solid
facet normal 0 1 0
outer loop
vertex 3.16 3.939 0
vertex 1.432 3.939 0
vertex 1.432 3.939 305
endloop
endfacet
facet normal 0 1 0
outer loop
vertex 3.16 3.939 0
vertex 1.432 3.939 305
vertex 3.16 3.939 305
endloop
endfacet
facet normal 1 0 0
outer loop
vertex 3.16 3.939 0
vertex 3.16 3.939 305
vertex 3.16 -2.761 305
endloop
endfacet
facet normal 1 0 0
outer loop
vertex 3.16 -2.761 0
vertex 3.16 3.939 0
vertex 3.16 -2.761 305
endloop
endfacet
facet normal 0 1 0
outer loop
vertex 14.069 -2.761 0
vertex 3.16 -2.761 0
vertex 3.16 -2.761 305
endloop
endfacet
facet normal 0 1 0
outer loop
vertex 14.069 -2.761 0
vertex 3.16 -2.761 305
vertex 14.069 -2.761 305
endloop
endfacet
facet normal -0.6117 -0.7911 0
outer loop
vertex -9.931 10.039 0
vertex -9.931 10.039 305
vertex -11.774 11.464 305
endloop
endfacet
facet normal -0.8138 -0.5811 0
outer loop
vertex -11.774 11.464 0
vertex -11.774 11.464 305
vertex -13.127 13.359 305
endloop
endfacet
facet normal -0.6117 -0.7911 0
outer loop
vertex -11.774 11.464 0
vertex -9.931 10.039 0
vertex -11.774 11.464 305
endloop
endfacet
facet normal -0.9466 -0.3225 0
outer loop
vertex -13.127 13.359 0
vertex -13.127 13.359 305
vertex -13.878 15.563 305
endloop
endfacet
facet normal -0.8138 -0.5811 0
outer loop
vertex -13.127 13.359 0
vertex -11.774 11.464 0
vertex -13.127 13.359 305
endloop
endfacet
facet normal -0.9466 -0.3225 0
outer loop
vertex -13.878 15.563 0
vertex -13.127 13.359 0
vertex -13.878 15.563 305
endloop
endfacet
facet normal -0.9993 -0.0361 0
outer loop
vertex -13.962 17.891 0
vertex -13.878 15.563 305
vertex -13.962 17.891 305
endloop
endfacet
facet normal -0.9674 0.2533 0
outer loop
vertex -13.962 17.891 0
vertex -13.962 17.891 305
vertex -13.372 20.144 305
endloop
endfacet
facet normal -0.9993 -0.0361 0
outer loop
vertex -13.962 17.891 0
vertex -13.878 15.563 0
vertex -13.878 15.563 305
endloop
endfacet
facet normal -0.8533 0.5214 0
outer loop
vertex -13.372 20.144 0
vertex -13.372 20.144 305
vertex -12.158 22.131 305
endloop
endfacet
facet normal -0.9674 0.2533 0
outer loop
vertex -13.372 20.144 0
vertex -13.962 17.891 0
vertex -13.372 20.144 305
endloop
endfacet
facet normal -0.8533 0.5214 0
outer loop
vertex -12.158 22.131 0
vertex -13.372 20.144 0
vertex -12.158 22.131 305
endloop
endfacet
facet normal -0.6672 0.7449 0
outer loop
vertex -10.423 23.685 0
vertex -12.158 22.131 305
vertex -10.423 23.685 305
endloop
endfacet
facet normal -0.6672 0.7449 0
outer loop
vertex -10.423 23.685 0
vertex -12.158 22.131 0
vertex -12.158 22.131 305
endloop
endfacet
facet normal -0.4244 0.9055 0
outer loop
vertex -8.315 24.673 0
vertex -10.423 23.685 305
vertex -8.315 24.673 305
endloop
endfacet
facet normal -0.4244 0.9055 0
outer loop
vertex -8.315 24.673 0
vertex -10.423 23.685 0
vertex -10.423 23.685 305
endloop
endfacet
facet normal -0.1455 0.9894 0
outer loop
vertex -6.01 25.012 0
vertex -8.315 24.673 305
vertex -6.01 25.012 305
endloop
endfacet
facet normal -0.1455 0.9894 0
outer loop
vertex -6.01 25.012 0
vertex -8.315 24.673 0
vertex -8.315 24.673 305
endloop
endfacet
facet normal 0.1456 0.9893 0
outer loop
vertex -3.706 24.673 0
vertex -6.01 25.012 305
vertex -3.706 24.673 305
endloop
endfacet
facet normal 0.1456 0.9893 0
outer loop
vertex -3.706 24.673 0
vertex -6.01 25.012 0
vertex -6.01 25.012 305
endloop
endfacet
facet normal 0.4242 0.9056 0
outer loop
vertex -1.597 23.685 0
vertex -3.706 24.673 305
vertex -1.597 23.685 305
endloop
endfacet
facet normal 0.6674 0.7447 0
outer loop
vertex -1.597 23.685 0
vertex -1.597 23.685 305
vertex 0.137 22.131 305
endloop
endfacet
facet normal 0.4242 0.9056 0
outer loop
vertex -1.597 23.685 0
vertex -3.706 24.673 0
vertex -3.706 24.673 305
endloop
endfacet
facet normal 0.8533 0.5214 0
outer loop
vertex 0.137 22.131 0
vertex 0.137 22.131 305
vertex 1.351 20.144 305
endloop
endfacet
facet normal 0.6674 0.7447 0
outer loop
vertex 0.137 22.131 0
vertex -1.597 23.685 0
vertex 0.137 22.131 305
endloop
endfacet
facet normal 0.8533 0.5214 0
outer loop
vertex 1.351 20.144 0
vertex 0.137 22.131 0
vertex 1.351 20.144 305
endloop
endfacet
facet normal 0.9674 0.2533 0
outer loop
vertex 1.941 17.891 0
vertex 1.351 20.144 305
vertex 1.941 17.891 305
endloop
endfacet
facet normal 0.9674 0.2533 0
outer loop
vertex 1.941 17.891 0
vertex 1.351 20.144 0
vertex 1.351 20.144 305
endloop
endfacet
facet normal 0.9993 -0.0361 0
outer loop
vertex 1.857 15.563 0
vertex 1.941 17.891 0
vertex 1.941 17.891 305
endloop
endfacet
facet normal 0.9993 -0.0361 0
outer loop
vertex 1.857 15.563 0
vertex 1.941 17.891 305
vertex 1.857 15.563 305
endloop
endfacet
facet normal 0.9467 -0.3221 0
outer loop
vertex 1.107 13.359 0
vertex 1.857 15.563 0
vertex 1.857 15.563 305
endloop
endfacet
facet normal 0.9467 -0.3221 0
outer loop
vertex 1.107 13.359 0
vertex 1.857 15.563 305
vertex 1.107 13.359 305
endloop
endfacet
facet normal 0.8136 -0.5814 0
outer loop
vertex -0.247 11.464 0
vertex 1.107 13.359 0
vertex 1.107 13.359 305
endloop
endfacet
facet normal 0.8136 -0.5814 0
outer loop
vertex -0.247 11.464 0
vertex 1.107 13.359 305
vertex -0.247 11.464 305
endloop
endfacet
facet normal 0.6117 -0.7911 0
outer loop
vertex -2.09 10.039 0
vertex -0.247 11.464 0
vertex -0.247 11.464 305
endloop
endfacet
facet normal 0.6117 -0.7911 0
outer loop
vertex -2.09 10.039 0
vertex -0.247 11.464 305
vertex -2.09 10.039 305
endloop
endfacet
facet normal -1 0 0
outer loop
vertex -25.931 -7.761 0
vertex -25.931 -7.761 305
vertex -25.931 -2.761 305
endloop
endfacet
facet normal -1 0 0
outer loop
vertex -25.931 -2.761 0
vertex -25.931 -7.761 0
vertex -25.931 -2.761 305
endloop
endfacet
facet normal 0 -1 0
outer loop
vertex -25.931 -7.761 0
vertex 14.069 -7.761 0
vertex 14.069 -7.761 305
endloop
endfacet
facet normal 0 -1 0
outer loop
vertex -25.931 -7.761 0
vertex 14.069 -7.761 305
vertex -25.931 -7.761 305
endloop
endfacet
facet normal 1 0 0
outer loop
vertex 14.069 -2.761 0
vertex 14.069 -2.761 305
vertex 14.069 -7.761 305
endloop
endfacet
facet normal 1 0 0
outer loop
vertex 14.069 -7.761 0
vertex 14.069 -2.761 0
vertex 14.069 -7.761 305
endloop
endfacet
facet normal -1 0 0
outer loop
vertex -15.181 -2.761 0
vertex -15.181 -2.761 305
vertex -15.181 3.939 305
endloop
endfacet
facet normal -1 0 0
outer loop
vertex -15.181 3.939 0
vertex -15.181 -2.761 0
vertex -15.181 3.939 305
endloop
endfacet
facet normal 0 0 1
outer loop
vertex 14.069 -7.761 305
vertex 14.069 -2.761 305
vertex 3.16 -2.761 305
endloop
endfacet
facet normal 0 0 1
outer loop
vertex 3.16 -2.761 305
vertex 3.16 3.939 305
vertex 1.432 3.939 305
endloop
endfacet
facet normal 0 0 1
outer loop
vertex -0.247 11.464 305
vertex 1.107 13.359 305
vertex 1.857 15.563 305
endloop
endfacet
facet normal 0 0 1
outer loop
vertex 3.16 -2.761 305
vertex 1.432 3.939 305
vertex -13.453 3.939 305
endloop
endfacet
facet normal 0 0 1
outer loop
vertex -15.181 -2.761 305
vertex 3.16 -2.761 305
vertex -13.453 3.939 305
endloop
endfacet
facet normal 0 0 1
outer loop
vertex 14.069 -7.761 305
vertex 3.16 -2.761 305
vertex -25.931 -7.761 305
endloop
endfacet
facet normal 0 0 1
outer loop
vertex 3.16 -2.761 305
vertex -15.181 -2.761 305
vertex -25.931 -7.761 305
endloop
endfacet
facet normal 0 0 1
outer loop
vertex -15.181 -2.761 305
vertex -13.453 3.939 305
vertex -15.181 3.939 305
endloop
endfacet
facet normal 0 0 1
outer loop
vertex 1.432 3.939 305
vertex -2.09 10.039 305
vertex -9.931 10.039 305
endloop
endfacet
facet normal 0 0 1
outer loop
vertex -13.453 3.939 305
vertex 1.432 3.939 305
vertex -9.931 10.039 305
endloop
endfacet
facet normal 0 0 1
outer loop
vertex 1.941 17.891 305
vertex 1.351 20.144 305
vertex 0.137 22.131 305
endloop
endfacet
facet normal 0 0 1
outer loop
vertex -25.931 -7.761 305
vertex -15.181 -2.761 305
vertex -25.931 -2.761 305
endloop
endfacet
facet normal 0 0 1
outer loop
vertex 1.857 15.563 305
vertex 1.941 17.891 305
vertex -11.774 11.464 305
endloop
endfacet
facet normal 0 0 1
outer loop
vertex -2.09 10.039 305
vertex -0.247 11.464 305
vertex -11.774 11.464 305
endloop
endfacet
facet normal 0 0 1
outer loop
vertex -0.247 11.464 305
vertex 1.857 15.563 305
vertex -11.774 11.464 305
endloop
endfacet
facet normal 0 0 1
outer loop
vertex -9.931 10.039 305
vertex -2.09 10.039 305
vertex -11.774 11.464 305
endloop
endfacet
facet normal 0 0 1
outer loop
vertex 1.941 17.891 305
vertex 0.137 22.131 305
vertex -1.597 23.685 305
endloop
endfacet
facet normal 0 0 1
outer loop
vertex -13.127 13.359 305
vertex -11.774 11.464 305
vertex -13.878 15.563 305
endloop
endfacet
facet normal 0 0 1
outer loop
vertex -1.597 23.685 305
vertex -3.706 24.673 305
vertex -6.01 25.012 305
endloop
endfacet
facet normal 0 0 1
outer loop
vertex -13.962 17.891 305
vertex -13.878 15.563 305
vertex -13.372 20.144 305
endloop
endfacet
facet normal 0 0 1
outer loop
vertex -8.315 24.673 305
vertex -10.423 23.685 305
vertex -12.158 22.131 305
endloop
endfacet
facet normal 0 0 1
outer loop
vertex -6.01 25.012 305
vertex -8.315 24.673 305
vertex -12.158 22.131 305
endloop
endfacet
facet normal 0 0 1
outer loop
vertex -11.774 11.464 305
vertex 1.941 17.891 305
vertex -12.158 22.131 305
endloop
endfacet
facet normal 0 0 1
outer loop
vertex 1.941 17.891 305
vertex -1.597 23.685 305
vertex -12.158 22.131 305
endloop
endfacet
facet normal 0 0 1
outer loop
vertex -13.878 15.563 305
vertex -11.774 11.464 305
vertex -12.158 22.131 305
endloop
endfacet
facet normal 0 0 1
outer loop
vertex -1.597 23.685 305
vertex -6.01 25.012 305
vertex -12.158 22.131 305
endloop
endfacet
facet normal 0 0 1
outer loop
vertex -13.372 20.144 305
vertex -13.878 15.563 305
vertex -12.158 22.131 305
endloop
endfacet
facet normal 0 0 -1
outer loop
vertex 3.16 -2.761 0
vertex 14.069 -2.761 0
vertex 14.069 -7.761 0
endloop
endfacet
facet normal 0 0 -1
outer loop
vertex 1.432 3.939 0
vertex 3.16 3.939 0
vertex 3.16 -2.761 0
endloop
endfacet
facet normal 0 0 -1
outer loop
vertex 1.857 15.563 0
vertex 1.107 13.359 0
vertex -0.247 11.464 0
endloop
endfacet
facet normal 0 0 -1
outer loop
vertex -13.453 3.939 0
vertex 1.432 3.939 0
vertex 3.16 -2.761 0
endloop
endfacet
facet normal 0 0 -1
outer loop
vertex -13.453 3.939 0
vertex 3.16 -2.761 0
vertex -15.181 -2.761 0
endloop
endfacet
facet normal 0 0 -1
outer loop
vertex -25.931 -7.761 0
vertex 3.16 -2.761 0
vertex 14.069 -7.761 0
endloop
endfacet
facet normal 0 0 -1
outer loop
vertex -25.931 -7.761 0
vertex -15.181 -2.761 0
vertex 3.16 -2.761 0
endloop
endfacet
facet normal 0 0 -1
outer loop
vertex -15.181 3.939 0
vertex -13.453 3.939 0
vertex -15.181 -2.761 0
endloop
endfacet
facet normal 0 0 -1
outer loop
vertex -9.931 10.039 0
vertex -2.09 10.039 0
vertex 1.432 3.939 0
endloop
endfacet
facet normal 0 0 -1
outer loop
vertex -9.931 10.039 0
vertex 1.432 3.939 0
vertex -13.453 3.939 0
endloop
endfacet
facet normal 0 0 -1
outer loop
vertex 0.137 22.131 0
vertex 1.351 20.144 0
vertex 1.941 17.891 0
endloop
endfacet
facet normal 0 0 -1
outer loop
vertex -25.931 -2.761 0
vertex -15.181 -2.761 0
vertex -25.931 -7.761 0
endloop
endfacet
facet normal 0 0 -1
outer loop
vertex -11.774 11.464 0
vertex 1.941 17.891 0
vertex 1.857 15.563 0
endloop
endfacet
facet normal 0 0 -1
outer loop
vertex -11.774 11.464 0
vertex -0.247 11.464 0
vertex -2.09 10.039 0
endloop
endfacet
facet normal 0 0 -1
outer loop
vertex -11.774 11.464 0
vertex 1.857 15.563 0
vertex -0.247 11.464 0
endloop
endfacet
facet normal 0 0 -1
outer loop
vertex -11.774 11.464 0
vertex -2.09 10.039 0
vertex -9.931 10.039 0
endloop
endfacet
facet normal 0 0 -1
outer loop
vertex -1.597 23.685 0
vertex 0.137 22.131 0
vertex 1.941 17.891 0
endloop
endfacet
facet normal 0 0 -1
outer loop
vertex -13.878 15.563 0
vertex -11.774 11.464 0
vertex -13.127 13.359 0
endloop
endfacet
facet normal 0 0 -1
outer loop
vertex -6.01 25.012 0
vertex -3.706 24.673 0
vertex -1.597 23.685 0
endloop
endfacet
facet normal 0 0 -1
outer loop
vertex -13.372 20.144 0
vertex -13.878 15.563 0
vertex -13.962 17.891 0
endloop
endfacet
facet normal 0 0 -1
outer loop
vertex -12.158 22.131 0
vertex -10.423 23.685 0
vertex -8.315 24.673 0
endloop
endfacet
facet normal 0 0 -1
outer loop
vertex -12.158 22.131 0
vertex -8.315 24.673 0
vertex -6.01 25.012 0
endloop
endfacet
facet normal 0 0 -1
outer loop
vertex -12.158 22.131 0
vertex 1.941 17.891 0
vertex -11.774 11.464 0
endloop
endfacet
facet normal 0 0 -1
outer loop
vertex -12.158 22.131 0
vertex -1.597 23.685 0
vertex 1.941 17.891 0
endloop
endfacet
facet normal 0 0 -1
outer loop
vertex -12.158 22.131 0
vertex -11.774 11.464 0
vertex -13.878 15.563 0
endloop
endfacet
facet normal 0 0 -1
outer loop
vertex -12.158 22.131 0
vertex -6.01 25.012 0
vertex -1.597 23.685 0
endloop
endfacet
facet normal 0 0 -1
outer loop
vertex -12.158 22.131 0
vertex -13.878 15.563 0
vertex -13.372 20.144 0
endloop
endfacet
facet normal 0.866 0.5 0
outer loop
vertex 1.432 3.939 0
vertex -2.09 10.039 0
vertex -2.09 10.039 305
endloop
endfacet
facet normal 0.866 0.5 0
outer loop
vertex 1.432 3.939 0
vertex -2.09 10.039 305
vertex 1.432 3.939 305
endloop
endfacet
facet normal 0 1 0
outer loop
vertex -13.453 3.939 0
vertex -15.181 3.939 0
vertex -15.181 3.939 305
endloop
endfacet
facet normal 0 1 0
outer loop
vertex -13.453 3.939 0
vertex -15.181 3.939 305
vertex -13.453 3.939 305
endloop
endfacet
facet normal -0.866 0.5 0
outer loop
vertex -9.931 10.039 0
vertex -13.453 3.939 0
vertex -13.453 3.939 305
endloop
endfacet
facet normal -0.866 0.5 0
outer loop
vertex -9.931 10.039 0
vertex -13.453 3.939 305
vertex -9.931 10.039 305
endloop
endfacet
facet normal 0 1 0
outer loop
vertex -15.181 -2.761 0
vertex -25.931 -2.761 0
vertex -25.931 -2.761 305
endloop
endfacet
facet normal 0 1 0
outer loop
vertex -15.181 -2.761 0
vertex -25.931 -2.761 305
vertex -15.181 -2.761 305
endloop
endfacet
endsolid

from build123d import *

# Parameters (mm, degrees)
BOSS_EXTRU_1_DEPTH = 305


with BuildPart() as part:
    # Esquisse1 → Boss.-Extru.1 (new body)
    with BuildSketch(Plane.XY):
        with BuildLine():
            Line((-25.931265673, -2.76101993), (-15.181265673, -2.76101993))
            Line((-15.181265673, -2.76101993), (-15.181265673, 3.93898007))
            Line((-15.181265673, 3.93898007), (-13.453102315, 3.93898007))
            Line((-13.453102315, 3.93898007), (-9.931265673, 10.03898007))
            ThreePointArc((-9.931265673, 10.03898007), (-6.010431334, 25.012290482), (-2.089596996, 10.03898007))
            Line((-2.089596996, 10.03898007), (1.432239646, 3.93898007))
            Line((1.432239646, 3.93898007), (3.160403004, 3.93898007))
            Line((3.160403004, 3.93898007), (3.160403004, -2.76101993))
            Line((3.160403004, -2.76101993), (14.068734327, -2.76101993))
            Line((14.068734327, -2.76101993), (14.068734327, -7.76101993))
            Line((14.068734327, -7.76101993), (-25.931265673, -7.76101993))
            Line((-25.931265673, -7.76101993), (-25.931265673, -2.76101993))
        make_face()
    extrude(amount=BOSS_EXTRU_1_DEPTH)


solid = part.part
